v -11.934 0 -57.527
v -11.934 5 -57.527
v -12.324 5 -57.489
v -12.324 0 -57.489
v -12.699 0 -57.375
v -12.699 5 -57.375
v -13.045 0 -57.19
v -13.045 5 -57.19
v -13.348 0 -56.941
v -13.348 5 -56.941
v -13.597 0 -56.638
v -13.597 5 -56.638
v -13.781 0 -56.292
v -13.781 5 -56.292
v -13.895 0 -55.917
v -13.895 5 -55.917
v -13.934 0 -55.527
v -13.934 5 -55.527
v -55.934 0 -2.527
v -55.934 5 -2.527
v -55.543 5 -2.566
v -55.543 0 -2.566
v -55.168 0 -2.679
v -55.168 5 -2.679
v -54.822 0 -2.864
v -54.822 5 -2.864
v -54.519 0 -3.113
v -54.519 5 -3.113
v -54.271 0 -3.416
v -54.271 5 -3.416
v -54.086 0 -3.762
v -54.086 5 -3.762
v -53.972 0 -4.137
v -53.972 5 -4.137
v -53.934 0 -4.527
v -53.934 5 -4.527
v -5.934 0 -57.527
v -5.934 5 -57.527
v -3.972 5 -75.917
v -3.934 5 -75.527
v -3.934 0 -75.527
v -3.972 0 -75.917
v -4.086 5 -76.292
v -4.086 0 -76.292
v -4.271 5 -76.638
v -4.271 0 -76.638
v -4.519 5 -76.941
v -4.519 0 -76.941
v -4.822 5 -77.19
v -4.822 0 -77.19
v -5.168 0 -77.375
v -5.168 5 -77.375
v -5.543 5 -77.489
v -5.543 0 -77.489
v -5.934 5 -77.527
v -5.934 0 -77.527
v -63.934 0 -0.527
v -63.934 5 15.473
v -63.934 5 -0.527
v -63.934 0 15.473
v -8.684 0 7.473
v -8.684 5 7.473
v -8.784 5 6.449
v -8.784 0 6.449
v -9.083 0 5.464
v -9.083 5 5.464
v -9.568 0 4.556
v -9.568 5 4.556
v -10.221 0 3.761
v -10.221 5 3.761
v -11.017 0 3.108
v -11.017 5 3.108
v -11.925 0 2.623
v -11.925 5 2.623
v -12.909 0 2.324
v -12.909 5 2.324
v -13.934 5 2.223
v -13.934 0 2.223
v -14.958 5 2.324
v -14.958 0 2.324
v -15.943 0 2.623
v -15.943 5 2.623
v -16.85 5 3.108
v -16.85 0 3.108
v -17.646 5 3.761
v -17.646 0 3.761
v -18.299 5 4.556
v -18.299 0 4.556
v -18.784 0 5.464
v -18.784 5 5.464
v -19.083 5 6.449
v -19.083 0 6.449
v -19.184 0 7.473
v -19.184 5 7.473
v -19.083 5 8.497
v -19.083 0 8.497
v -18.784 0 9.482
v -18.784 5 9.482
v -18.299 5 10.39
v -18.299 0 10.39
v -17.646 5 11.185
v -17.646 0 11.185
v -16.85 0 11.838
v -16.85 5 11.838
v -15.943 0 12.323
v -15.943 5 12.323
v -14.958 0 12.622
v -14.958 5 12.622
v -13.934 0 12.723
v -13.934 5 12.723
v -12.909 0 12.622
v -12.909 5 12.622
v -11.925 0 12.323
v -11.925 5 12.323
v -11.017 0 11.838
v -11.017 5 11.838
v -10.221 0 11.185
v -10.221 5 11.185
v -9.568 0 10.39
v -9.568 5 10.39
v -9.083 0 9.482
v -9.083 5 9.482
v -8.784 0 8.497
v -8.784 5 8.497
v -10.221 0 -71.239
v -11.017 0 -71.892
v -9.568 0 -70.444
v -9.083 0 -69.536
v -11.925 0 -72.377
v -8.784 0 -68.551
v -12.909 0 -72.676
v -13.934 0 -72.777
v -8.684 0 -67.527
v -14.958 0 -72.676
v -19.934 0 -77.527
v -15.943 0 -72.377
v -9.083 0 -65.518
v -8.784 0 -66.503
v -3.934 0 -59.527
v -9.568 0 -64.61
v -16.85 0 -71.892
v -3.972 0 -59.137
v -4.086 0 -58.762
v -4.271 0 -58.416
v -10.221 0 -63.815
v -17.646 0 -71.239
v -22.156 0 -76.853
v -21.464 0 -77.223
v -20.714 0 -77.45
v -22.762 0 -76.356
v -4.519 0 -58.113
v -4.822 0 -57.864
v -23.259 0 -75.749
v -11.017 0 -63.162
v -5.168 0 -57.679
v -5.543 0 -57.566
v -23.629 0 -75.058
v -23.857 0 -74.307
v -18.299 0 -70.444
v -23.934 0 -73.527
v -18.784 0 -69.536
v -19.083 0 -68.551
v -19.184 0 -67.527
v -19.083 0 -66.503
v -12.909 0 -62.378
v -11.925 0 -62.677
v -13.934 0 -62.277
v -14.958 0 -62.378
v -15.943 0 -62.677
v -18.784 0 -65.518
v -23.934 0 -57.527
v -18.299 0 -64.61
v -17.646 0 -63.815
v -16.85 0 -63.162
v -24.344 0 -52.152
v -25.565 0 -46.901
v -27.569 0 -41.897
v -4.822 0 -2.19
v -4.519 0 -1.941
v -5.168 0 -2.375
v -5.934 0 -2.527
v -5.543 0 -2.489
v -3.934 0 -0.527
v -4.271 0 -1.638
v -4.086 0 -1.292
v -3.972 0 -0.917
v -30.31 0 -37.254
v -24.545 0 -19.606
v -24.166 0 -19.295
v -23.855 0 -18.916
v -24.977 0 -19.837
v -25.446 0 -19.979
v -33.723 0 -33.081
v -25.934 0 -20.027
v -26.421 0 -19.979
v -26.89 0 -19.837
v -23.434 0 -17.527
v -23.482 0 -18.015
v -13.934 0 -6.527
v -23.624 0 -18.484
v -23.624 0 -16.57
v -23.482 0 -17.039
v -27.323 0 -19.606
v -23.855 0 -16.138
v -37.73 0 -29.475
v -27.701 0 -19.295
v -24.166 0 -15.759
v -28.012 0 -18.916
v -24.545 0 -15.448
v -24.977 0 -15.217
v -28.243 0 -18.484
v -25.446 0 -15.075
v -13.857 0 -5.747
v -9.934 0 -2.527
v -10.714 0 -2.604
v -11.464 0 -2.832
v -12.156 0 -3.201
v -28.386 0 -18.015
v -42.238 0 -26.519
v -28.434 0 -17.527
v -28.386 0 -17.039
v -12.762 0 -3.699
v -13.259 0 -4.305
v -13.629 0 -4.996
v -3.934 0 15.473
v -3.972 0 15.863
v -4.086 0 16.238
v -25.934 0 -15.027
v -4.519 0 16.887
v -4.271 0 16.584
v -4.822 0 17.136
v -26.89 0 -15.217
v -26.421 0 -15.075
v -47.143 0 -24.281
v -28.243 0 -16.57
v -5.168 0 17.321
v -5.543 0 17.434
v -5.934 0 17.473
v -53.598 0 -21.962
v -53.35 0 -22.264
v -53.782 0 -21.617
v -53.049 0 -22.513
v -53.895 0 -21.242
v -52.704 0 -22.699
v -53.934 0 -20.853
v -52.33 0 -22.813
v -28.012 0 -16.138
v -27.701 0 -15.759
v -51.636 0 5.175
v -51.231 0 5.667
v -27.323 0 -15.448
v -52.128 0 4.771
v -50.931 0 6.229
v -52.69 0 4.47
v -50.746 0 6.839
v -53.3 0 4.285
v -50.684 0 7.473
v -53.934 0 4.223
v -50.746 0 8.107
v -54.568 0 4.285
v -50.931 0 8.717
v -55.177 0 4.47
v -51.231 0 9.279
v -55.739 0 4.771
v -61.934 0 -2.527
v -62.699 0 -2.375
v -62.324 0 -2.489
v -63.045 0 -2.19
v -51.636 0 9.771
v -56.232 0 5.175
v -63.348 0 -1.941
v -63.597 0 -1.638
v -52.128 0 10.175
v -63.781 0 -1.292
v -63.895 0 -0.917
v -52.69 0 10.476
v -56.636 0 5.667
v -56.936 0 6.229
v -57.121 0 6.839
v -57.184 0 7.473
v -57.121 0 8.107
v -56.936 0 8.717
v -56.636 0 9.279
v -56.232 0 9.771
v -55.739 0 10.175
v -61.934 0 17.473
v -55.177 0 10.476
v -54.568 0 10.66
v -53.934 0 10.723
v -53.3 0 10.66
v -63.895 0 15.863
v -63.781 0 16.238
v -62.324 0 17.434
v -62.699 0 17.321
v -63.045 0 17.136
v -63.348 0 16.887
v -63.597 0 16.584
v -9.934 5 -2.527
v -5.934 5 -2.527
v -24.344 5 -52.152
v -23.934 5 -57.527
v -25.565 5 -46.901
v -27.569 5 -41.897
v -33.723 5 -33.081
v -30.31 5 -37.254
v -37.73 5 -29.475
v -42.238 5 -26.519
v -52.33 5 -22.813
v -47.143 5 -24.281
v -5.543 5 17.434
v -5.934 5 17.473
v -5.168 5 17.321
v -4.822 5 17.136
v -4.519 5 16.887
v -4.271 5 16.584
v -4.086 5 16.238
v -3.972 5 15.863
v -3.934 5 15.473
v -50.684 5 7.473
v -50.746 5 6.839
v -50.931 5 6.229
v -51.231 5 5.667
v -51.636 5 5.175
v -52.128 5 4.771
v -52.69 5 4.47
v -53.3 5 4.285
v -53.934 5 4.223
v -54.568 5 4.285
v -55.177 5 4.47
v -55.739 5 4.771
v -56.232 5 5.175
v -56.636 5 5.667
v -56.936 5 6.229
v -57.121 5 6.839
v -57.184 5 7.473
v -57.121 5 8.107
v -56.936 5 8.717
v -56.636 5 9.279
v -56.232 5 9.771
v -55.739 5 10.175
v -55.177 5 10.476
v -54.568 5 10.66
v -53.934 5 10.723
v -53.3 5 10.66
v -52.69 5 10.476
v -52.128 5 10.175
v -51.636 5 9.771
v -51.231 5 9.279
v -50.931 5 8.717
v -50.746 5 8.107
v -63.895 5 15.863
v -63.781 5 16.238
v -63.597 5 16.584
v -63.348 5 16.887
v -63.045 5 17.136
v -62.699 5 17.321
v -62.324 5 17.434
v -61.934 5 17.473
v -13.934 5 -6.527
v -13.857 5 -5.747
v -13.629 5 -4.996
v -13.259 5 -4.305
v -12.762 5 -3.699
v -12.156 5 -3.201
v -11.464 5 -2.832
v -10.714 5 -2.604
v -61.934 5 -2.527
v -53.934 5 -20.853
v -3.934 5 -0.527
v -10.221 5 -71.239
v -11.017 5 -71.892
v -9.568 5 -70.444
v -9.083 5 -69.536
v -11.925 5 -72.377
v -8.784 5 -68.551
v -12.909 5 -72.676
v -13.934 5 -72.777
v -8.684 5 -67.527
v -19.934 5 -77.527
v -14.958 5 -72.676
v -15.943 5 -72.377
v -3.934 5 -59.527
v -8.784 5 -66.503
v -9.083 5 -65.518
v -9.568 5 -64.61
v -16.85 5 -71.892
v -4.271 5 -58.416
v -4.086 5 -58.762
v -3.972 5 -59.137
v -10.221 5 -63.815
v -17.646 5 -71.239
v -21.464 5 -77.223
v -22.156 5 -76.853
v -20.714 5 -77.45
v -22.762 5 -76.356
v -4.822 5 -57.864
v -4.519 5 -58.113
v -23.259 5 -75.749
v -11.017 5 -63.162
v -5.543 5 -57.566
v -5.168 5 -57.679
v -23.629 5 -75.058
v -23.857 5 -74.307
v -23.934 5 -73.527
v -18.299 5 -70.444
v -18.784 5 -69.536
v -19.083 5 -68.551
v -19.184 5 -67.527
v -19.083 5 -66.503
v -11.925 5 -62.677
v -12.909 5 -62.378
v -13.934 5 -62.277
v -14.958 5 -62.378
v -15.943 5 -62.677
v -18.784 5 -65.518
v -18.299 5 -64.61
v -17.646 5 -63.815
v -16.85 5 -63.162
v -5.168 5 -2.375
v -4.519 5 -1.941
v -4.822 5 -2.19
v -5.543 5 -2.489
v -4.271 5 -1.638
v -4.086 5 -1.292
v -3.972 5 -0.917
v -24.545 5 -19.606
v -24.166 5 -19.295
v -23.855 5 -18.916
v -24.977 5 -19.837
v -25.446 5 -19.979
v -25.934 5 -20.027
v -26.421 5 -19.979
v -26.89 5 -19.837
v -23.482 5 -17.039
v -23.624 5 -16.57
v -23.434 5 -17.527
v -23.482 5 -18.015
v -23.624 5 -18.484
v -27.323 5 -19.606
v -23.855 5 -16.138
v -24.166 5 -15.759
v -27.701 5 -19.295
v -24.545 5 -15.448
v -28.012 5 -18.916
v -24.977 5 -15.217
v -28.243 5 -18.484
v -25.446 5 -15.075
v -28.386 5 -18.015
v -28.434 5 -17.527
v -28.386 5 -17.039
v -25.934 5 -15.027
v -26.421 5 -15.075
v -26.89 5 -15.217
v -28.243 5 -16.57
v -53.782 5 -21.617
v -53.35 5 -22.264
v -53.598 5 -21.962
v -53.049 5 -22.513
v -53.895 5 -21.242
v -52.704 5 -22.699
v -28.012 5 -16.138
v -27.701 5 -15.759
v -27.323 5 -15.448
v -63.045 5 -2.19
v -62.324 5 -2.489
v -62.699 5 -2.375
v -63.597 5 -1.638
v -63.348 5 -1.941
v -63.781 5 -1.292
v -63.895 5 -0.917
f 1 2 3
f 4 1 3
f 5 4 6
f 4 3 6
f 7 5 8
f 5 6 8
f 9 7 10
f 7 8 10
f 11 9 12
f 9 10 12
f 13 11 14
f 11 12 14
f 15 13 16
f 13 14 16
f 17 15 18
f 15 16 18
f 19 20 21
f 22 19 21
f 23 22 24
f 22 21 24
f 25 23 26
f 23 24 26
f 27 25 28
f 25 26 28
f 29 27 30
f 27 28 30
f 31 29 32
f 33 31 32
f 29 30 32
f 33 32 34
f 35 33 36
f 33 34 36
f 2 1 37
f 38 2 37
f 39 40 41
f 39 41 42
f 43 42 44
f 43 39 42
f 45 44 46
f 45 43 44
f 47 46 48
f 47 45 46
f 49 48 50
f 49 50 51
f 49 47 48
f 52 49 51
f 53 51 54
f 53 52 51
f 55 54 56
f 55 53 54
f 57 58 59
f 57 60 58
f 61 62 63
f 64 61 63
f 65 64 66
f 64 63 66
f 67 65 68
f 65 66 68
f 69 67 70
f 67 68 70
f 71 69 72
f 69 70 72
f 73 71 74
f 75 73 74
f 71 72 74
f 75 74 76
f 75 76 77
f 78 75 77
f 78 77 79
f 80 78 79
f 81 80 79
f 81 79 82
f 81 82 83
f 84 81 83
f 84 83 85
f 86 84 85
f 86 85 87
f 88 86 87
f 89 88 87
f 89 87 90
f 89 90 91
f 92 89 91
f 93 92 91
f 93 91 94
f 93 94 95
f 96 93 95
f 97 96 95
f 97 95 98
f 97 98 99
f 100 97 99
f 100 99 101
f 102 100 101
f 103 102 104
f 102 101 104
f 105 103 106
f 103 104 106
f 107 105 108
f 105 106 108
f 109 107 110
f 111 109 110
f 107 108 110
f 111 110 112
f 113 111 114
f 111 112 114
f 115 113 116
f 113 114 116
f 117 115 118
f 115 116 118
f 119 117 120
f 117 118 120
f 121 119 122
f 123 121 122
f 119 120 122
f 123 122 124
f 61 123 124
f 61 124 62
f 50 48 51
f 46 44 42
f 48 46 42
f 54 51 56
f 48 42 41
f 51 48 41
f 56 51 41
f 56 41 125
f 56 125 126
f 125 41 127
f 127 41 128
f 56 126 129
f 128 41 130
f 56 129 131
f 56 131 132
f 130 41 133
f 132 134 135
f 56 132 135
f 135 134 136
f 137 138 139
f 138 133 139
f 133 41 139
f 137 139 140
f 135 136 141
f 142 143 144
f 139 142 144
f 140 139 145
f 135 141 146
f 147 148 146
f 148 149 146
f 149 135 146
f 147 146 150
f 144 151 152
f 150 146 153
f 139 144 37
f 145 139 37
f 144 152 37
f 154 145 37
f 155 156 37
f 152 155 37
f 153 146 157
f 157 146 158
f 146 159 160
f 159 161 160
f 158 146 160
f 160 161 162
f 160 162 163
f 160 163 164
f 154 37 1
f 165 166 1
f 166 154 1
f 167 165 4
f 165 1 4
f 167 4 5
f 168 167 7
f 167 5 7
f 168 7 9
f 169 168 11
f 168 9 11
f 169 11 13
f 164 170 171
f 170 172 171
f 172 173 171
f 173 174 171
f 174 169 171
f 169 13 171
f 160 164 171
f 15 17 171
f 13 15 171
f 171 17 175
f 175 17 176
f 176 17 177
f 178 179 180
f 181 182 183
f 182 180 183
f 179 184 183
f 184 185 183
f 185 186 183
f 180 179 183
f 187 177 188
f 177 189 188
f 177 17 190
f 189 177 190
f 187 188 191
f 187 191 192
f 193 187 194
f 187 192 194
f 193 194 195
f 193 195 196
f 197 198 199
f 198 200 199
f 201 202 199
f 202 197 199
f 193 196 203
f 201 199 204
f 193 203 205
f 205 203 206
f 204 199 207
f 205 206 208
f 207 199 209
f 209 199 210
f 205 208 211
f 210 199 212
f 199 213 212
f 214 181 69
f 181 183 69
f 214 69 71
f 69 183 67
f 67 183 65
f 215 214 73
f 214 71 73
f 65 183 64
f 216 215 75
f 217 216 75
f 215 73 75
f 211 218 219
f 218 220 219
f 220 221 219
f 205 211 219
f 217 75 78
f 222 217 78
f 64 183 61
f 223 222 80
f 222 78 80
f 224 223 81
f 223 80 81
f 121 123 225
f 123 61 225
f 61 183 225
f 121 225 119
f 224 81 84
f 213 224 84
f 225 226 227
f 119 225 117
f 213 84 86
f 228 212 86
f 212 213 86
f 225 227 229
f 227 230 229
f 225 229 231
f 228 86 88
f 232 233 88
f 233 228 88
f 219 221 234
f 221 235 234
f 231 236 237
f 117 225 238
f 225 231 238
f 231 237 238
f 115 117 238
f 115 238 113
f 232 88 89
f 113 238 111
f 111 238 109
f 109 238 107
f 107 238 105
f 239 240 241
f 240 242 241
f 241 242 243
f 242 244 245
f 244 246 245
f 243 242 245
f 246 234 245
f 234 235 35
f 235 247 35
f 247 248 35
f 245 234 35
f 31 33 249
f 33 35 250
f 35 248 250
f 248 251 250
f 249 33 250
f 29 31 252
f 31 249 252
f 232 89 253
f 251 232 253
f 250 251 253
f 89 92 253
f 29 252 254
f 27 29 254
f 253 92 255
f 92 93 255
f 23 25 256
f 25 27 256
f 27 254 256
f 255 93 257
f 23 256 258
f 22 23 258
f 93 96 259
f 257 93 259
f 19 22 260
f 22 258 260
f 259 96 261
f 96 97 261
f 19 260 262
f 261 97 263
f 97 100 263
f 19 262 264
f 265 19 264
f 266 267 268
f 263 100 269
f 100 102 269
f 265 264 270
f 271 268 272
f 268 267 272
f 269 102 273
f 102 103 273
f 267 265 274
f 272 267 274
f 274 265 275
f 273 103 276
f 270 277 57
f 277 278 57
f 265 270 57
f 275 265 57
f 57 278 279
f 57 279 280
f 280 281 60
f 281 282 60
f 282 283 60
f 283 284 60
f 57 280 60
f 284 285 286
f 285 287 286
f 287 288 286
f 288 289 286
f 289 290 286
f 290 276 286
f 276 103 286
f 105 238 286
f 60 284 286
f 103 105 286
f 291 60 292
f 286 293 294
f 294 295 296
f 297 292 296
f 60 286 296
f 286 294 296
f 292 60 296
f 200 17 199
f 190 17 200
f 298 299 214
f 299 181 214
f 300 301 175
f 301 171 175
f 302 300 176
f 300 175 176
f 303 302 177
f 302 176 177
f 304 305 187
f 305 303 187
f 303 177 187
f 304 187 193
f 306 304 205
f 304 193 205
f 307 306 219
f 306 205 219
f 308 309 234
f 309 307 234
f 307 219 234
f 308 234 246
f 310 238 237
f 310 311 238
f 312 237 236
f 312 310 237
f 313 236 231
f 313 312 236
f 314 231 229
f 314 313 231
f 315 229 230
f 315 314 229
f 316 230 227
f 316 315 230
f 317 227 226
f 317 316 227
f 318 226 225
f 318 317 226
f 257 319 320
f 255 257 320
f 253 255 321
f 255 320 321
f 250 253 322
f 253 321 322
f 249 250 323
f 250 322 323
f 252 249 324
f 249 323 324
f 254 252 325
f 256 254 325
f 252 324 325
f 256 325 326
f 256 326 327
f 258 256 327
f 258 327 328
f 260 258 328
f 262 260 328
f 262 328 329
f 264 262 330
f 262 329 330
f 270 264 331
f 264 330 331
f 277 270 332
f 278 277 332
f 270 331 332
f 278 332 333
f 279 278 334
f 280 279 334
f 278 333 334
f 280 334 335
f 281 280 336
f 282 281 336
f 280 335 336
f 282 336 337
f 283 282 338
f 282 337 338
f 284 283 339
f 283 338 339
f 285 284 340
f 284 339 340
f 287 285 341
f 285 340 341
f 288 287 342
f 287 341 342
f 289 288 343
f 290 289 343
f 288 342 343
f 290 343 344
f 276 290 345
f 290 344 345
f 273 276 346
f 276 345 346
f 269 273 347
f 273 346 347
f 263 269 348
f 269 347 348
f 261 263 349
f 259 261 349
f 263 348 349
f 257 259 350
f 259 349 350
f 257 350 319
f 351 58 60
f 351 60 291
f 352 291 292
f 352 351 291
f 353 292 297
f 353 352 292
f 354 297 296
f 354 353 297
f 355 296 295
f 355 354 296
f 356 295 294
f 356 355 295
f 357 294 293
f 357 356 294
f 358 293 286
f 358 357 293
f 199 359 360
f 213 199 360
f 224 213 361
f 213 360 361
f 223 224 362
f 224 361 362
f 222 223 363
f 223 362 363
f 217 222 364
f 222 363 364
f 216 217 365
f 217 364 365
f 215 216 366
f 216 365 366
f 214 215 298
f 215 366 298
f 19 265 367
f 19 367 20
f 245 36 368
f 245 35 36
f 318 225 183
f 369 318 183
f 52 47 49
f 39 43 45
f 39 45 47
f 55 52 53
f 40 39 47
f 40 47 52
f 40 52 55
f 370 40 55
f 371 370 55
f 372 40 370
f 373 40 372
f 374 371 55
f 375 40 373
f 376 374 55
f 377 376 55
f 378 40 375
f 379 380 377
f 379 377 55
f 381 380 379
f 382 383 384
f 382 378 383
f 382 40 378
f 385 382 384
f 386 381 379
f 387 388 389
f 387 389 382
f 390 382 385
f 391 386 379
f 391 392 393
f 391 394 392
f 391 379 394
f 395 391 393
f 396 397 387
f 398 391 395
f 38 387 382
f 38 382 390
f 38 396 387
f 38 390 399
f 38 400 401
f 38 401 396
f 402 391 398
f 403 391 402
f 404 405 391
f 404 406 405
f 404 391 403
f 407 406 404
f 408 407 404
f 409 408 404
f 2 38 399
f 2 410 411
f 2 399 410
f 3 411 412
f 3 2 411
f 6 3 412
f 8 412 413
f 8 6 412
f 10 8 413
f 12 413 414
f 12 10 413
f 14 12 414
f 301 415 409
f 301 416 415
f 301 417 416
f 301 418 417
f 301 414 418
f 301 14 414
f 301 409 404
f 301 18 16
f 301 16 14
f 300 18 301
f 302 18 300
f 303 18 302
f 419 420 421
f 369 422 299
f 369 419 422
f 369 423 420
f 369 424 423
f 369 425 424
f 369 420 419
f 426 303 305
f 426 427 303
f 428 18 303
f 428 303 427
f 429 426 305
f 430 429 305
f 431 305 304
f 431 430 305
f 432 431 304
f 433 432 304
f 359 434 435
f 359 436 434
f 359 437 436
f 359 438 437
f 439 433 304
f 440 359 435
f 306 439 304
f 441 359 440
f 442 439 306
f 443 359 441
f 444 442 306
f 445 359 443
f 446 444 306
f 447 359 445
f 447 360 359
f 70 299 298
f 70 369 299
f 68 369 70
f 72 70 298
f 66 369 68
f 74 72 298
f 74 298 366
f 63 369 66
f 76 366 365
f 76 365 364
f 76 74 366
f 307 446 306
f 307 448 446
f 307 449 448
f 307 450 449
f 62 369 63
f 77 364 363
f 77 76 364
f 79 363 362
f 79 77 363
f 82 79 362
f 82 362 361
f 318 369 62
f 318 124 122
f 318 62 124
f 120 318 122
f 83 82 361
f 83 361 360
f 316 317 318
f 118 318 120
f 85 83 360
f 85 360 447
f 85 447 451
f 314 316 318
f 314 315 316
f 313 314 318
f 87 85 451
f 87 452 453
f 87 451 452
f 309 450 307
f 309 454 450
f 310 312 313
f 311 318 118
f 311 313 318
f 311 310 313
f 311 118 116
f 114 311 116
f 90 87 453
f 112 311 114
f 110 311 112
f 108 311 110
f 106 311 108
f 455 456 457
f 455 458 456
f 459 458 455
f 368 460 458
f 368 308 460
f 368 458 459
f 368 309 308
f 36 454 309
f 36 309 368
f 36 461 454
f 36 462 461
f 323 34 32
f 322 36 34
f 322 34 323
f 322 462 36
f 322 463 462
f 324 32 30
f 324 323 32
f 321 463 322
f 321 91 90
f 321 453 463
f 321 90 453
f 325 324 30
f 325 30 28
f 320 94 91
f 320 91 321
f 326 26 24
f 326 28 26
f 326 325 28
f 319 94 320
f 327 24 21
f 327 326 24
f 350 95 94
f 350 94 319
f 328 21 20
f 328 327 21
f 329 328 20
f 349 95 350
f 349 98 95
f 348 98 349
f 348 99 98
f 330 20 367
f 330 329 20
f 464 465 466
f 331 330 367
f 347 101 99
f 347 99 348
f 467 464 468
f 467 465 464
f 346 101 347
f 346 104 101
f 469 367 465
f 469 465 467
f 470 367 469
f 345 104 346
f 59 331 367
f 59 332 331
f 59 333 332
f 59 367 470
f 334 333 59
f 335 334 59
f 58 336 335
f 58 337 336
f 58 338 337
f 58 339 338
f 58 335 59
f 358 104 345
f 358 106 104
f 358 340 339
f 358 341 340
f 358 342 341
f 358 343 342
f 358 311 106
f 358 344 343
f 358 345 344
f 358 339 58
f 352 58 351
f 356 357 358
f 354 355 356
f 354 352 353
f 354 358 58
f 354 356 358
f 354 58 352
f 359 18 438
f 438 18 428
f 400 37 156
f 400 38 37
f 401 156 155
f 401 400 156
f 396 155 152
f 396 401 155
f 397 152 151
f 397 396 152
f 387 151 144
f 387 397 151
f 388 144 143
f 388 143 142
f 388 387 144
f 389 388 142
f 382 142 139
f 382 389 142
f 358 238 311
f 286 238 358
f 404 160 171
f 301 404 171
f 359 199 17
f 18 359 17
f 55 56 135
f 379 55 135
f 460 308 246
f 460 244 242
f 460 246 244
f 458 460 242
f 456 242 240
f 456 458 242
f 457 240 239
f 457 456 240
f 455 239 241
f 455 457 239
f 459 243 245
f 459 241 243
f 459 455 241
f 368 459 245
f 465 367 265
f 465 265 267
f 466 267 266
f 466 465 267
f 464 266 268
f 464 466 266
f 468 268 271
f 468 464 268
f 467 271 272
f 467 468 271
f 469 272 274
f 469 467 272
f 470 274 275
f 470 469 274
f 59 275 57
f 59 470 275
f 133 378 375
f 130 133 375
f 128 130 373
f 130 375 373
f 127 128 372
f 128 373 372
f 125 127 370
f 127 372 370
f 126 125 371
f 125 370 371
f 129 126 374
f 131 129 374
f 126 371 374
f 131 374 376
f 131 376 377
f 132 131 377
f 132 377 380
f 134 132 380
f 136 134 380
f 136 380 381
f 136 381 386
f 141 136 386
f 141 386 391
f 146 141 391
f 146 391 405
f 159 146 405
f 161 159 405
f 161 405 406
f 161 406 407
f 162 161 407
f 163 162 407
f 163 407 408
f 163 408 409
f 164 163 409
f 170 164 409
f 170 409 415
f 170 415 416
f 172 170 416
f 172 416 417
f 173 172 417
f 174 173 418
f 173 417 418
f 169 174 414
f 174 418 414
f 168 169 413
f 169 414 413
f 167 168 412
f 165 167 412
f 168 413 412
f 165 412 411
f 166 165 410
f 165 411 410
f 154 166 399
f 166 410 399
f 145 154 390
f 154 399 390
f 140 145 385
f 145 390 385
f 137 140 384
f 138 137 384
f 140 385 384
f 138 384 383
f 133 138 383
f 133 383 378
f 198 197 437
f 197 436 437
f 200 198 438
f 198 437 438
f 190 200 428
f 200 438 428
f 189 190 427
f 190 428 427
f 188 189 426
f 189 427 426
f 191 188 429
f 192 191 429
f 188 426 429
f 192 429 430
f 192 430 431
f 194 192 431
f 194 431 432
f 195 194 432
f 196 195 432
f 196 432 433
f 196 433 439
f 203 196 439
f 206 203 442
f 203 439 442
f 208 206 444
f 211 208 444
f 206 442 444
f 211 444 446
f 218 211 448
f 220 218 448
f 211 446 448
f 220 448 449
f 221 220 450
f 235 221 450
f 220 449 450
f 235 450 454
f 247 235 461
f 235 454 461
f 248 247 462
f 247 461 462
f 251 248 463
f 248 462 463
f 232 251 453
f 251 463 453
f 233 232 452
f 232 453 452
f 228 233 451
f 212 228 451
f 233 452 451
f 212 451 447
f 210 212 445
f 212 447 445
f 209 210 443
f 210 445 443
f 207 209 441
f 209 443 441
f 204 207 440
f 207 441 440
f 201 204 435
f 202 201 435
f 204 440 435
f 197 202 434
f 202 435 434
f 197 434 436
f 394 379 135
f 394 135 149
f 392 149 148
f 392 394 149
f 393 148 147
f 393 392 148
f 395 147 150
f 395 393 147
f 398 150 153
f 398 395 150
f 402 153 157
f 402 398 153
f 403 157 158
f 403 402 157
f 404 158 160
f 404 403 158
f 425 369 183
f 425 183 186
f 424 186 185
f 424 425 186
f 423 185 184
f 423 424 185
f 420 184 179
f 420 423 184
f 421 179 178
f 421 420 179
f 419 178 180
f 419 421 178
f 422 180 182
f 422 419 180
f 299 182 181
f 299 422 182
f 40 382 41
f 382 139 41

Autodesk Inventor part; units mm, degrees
ref_plane "YZ Plane" through (0, 0, 0) normal (1, 0, 0) x (0, 1, 0)
ref_plane "XZ Plane" through (0, 0, 0) normal (0, 1, 0) x (-1, 0, 0)
ref_plane "XY Plane" through (0, 0, 0) normal (0, 0, 1) x (1, 0, 0)
sketch "Sketch1" plane through (0, 0, 0) normal (0, 1, 0) x (-1, 0, 0)
  line L0 (3.9336, 17.4729) -> (3.9336, -2.5271)
  line L1 (3.9336, -2.5271) -> (13.9336, -2.5271)
  line L2 (13.9336, -2.5271) -> (13.9336, -57.5271)
  line L3 (13.9336, -57.5271) -> (3.9336, -57.5271)
  line L4 (3.9336, -57.5271) -> (3.9336, -77.5271)
  line L5 (3.9336, -77.5271) -> (23.9336, -77.5271)
  line L6 (23.9336, -77.5271) -> (23.9336, -57.5271)
  line L7 (3.9336, 17.4729) -> (63.9336, 17.4729)
  line L8 (63.9336, 17.4729) -> (63.9336, -2.5271)
  line L9 (63.9336, -2.5271) -> (53.9336, -2.5271)
  line L10 (53.9336, -2.5271) -> (53.9336, -22.5271)
  arc A0 (53.9336, -22.5271) -> (23.9336, -57.5271) centre (59.3503, -57.5271) ccw
  point P0 (0, 0)
  dimension "d0" = 20
  dimension "d1" = 10
  dimension "d2" = 55
  dimension "d3" = 10
  dimension "d4" = 20
  dimension "d5" = 20
  dimension "d6" = 20
  dimension "d7" = 60
  dimension "d8" = 20
  dimension "d9" = 10
  dimension "d10" = 20
extrude "Extrusion1" add sketch "Sketch1" along normal blind 5
sketch "Sketch2" plane through (0, 5, 0) normal (0, 1, 0) x (1, 0, 0)
  circle A0 centre (-13.9336, -7.4729) radius 5.25
  circle A1 centre (-13.9336, 67.5271) radius 5.25
  circle A2 centre (-53.9336, -7.4729) radius 3.25
  point P0 (0, 0)
  point P1 (-3.9336, -17.4729)
  point P2 (-3.9336, 77.5271)
  dimension "d15" = 10.5
  dimension "d18" = 10.5
  dimension "d21" = 6.5
extrude "Extrusion2" cut sketch "Sketch2" along normal through all both and the other way through all
sketch "Sketch3" plane through (0, 5, 0) normal (0, 1, 0) x (1, 0, 0)
  line L0 (-63.9336, -17.4729) -> (-3.9336, -17.4729) projected
  line L1 (-13.9336, 2.5271) -> (-13.9336, 57.5271) projected
  circle A0 centre (-25.9336, 17.5271) radius 2.5
  point P0 (0, 0)
  dimension "d27" = 5
extrude "Extrusion3" cut sketch "Sketch3" against normal through all
fillet "Fillet1" radius 4 2 edges at (-13.9336, 2.5, -2.5271) (-23.9336, 2.5, -77.5271)
fillet "Fillet2" radius 2 7 edges at (-3.9336, 2.5, 17.4729) (-63.9336, 2.5, 17.4729) (-3.9336, 2.5, -2.5271) (-3.9336, 2.5, -57.5271) (-3.9336, 2.5, -77.5271) (-63.9336, 2.5, -2.5271) (-53.9336, 2.5, -22.5271)
fillet "Fillet3" radius 2 2 edges at (-13.9336, 2.5, -57.5271) (-53.9336, 2.5, -2.5271)
properties part number "autodesk"
